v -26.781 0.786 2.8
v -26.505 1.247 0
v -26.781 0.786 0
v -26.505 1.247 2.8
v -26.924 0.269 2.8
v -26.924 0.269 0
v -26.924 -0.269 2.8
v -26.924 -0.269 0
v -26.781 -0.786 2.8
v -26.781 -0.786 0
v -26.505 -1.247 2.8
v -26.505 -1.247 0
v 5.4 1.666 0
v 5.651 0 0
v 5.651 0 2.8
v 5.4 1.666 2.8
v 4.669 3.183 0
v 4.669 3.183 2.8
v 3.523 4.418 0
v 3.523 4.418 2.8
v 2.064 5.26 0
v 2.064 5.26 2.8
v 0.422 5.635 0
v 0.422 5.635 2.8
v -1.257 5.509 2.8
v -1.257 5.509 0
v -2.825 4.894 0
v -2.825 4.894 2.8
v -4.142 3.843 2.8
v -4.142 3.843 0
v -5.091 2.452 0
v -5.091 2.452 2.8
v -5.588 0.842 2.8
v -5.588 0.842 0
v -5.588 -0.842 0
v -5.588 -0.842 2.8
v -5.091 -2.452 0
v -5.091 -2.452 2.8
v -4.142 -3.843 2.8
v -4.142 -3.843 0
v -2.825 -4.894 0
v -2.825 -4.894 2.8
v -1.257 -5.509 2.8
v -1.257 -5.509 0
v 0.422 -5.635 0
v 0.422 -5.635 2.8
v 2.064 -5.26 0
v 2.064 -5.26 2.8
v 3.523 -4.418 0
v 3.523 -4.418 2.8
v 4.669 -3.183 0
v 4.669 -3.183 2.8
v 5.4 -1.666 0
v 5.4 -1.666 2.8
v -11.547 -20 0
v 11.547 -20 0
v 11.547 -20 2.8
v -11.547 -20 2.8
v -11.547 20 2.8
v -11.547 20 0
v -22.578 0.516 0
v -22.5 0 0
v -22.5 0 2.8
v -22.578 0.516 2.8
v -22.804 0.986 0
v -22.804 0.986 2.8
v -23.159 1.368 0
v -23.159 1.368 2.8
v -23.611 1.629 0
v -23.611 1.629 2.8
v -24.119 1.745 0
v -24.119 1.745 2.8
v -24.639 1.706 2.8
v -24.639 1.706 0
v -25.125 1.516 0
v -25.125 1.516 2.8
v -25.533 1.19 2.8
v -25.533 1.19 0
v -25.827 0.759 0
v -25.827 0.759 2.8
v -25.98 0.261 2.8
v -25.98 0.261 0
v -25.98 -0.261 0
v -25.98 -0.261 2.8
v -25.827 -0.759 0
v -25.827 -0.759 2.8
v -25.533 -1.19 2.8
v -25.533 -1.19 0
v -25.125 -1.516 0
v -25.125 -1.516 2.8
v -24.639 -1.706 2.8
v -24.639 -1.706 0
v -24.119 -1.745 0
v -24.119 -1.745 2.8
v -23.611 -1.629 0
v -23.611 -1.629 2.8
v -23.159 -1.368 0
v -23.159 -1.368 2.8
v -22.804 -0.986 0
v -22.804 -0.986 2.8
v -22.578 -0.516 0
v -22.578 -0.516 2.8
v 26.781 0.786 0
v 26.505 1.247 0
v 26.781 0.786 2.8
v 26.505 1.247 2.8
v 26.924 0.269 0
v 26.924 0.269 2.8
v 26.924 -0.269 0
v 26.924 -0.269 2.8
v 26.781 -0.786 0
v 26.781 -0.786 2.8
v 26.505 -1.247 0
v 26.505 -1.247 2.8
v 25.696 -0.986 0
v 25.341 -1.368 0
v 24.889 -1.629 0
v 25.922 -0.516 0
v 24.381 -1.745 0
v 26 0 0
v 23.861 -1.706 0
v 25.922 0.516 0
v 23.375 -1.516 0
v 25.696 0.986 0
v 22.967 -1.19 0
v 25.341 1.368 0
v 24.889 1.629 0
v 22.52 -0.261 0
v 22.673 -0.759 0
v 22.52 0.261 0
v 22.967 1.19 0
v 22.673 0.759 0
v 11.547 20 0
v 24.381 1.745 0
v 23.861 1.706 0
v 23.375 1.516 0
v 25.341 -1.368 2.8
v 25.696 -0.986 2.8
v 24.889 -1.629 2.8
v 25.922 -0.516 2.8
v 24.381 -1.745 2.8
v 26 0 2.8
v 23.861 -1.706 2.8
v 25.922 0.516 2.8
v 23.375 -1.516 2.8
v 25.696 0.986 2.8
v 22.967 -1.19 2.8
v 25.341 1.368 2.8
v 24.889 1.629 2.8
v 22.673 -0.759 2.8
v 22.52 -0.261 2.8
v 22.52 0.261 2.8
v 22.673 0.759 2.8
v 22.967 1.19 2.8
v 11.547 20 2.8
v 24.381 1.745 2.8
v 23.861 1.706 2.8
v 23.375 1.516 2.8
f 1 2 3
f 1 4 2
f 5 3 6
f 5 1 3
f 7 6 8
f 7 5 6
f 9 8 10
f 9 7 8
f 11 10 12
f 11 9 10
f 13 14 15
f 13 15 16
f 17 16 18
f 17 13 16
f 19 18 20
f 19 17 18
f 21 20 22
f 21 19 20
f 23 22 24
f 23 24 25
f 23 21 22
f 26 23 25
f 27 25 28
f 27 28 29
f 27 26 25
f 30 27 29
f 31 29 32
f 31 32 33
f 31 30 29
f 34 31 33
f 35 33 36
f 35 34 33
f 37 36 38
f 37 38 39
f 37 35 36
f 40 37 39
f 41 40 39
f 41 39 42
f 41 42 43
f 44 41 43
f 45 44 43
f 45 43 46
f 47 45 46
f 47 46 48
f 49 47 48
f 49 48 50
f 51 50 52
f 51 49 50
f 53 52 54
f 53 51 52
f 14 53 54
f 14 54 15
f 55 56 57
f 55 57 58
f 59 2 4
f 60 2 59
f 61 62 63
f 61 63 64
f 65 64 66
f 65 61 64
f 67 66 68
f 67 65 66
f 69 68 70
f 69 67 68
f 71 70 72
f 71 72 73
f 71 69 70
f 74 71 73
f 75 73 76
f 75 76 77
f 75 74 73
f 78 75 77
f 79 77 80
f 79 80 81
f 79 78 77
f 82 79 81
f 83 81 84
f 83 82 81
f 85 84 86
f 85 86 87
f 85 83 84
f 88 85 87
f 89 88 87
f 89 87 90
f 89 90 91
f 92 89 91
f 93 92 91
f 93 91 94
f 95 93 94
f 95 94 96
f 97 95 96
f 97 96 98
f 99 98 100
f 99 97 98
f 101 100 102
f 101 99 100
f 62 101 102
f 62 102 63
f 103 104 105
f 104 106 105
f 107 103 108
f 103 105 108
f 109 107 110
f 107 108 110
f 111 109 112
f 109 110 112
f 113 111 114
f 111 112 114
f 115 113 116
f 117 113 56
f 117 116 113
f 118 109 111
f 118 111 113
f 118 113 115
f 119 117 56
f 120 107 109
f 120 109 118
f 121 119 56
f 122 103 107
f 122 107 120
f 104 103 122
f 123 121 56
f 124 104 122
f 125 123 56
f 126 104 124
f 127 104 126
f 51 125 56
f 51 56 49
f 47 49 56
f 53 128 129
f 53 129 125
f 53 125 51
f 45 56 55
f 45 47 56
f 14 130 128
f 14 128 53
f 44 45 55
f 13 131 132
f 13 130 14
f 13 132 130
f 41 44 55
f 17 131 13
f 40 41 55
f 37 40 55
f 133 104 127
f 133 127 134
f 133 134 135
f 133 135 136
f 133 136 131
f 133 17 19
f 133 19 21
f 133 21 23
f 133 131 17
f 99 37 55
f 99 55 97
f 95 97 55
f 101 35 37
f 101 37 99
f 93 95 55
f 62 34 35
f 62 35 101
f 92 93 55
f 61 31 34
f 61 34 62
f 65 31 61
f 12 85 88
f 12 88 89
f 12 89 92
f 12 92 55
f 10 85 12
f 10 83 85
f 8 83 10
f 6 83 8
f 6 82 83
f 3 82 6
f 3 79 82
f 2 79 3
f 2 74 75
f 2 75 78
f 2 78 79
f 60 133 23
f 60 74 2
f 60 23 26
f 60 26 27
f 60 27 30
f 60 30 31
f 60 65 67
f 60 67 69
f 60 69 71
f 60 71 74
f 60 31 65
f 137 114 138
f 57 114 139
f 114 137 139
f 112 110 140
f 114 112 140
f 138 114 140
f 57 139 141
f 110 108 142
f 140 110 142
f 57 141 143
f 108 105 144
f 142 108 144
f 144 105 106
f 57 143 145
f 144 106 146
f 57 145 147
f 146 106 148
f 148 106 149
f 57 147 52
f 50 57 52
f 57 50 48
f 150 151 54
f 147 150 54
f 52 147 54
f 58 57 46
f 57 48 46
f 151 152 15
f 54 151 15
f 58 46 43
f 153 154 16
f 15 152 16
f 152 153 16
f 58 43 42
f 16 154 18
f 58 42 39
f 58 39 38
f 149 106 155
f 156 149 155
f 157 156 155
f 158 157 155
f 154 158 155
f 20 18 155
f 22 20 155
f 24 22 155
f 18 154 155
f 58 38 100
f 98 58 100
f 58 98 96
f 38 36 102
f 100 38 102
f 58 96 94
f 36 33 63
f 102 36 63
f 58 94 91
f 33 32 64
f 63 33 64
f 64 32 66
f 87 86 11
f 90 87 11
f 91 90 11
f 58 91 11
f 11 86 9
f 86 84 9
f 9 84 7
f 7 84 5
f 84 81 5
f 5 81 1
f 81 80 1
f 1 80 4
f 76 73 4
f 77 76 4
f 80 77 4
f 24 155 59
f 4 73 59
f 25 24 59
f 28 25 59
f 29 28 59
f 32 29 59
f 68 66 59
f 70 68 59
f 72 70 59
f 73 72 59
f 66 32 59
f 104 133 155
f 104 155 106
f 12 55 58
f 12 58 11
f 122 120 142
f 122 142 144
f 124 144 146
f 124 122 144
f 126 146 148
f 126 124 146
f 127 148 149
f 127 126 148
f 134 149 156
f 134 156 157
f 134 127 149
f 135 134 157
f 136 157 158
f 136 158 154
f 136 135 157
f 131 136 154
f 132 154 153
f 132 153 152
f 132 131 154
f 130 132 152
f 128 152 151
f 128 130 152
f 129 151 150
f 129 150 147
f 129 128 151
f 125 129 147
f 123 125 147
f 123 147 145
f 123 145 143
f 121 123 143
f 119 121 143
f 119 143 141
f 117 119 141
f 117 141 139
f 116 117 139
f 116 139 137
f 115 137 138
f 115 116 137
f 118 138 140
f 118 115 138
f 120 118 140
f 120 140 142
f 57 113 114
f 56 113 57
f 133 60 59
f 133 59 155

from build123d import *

# Parameters (mm, degrees)
SKETCH1_R           = 5.650668072
SKETCH1_R_2         = 1.75
BOSS_EXTRUDE1_DEPTH = 2.8
FILLET1_R           = 2


with BuildPart() as part:
    # Sketch1 → Boss-Extrude1 (new body)
    with BuildSketch(Plane.XY):
        Polygon((11.547005384, 20), (27.5, 0), (11.547005384, -20), (-11.547005384, -20), (-27.5, 0), (-11.547005384, 20), align=None)
        Circle(SKETCH1_R, mode=Mode.SUBTRACT)
        with Locations((-24.25, 0)):
            Circle(SKETCH1_R_2, mode=Mode.SUBTRACT)
        with Locations((24.25, 0)):
            Circle(SKETCH1_R_2, mode=Mode.SUBTRACT)
    extrude(amount=BOSS_EXTRUDE1_DEPTH)

    # Fillet1
    fillet1_edges = [part.edges().sort_by_distance(p)[0] for p in [
        (27.5, 0, 1.4),
        (-27.5, 0, 1.4),
    ]]
    fillet(fillet1_edges, radius=FILLET1_R)


solid = part.part
